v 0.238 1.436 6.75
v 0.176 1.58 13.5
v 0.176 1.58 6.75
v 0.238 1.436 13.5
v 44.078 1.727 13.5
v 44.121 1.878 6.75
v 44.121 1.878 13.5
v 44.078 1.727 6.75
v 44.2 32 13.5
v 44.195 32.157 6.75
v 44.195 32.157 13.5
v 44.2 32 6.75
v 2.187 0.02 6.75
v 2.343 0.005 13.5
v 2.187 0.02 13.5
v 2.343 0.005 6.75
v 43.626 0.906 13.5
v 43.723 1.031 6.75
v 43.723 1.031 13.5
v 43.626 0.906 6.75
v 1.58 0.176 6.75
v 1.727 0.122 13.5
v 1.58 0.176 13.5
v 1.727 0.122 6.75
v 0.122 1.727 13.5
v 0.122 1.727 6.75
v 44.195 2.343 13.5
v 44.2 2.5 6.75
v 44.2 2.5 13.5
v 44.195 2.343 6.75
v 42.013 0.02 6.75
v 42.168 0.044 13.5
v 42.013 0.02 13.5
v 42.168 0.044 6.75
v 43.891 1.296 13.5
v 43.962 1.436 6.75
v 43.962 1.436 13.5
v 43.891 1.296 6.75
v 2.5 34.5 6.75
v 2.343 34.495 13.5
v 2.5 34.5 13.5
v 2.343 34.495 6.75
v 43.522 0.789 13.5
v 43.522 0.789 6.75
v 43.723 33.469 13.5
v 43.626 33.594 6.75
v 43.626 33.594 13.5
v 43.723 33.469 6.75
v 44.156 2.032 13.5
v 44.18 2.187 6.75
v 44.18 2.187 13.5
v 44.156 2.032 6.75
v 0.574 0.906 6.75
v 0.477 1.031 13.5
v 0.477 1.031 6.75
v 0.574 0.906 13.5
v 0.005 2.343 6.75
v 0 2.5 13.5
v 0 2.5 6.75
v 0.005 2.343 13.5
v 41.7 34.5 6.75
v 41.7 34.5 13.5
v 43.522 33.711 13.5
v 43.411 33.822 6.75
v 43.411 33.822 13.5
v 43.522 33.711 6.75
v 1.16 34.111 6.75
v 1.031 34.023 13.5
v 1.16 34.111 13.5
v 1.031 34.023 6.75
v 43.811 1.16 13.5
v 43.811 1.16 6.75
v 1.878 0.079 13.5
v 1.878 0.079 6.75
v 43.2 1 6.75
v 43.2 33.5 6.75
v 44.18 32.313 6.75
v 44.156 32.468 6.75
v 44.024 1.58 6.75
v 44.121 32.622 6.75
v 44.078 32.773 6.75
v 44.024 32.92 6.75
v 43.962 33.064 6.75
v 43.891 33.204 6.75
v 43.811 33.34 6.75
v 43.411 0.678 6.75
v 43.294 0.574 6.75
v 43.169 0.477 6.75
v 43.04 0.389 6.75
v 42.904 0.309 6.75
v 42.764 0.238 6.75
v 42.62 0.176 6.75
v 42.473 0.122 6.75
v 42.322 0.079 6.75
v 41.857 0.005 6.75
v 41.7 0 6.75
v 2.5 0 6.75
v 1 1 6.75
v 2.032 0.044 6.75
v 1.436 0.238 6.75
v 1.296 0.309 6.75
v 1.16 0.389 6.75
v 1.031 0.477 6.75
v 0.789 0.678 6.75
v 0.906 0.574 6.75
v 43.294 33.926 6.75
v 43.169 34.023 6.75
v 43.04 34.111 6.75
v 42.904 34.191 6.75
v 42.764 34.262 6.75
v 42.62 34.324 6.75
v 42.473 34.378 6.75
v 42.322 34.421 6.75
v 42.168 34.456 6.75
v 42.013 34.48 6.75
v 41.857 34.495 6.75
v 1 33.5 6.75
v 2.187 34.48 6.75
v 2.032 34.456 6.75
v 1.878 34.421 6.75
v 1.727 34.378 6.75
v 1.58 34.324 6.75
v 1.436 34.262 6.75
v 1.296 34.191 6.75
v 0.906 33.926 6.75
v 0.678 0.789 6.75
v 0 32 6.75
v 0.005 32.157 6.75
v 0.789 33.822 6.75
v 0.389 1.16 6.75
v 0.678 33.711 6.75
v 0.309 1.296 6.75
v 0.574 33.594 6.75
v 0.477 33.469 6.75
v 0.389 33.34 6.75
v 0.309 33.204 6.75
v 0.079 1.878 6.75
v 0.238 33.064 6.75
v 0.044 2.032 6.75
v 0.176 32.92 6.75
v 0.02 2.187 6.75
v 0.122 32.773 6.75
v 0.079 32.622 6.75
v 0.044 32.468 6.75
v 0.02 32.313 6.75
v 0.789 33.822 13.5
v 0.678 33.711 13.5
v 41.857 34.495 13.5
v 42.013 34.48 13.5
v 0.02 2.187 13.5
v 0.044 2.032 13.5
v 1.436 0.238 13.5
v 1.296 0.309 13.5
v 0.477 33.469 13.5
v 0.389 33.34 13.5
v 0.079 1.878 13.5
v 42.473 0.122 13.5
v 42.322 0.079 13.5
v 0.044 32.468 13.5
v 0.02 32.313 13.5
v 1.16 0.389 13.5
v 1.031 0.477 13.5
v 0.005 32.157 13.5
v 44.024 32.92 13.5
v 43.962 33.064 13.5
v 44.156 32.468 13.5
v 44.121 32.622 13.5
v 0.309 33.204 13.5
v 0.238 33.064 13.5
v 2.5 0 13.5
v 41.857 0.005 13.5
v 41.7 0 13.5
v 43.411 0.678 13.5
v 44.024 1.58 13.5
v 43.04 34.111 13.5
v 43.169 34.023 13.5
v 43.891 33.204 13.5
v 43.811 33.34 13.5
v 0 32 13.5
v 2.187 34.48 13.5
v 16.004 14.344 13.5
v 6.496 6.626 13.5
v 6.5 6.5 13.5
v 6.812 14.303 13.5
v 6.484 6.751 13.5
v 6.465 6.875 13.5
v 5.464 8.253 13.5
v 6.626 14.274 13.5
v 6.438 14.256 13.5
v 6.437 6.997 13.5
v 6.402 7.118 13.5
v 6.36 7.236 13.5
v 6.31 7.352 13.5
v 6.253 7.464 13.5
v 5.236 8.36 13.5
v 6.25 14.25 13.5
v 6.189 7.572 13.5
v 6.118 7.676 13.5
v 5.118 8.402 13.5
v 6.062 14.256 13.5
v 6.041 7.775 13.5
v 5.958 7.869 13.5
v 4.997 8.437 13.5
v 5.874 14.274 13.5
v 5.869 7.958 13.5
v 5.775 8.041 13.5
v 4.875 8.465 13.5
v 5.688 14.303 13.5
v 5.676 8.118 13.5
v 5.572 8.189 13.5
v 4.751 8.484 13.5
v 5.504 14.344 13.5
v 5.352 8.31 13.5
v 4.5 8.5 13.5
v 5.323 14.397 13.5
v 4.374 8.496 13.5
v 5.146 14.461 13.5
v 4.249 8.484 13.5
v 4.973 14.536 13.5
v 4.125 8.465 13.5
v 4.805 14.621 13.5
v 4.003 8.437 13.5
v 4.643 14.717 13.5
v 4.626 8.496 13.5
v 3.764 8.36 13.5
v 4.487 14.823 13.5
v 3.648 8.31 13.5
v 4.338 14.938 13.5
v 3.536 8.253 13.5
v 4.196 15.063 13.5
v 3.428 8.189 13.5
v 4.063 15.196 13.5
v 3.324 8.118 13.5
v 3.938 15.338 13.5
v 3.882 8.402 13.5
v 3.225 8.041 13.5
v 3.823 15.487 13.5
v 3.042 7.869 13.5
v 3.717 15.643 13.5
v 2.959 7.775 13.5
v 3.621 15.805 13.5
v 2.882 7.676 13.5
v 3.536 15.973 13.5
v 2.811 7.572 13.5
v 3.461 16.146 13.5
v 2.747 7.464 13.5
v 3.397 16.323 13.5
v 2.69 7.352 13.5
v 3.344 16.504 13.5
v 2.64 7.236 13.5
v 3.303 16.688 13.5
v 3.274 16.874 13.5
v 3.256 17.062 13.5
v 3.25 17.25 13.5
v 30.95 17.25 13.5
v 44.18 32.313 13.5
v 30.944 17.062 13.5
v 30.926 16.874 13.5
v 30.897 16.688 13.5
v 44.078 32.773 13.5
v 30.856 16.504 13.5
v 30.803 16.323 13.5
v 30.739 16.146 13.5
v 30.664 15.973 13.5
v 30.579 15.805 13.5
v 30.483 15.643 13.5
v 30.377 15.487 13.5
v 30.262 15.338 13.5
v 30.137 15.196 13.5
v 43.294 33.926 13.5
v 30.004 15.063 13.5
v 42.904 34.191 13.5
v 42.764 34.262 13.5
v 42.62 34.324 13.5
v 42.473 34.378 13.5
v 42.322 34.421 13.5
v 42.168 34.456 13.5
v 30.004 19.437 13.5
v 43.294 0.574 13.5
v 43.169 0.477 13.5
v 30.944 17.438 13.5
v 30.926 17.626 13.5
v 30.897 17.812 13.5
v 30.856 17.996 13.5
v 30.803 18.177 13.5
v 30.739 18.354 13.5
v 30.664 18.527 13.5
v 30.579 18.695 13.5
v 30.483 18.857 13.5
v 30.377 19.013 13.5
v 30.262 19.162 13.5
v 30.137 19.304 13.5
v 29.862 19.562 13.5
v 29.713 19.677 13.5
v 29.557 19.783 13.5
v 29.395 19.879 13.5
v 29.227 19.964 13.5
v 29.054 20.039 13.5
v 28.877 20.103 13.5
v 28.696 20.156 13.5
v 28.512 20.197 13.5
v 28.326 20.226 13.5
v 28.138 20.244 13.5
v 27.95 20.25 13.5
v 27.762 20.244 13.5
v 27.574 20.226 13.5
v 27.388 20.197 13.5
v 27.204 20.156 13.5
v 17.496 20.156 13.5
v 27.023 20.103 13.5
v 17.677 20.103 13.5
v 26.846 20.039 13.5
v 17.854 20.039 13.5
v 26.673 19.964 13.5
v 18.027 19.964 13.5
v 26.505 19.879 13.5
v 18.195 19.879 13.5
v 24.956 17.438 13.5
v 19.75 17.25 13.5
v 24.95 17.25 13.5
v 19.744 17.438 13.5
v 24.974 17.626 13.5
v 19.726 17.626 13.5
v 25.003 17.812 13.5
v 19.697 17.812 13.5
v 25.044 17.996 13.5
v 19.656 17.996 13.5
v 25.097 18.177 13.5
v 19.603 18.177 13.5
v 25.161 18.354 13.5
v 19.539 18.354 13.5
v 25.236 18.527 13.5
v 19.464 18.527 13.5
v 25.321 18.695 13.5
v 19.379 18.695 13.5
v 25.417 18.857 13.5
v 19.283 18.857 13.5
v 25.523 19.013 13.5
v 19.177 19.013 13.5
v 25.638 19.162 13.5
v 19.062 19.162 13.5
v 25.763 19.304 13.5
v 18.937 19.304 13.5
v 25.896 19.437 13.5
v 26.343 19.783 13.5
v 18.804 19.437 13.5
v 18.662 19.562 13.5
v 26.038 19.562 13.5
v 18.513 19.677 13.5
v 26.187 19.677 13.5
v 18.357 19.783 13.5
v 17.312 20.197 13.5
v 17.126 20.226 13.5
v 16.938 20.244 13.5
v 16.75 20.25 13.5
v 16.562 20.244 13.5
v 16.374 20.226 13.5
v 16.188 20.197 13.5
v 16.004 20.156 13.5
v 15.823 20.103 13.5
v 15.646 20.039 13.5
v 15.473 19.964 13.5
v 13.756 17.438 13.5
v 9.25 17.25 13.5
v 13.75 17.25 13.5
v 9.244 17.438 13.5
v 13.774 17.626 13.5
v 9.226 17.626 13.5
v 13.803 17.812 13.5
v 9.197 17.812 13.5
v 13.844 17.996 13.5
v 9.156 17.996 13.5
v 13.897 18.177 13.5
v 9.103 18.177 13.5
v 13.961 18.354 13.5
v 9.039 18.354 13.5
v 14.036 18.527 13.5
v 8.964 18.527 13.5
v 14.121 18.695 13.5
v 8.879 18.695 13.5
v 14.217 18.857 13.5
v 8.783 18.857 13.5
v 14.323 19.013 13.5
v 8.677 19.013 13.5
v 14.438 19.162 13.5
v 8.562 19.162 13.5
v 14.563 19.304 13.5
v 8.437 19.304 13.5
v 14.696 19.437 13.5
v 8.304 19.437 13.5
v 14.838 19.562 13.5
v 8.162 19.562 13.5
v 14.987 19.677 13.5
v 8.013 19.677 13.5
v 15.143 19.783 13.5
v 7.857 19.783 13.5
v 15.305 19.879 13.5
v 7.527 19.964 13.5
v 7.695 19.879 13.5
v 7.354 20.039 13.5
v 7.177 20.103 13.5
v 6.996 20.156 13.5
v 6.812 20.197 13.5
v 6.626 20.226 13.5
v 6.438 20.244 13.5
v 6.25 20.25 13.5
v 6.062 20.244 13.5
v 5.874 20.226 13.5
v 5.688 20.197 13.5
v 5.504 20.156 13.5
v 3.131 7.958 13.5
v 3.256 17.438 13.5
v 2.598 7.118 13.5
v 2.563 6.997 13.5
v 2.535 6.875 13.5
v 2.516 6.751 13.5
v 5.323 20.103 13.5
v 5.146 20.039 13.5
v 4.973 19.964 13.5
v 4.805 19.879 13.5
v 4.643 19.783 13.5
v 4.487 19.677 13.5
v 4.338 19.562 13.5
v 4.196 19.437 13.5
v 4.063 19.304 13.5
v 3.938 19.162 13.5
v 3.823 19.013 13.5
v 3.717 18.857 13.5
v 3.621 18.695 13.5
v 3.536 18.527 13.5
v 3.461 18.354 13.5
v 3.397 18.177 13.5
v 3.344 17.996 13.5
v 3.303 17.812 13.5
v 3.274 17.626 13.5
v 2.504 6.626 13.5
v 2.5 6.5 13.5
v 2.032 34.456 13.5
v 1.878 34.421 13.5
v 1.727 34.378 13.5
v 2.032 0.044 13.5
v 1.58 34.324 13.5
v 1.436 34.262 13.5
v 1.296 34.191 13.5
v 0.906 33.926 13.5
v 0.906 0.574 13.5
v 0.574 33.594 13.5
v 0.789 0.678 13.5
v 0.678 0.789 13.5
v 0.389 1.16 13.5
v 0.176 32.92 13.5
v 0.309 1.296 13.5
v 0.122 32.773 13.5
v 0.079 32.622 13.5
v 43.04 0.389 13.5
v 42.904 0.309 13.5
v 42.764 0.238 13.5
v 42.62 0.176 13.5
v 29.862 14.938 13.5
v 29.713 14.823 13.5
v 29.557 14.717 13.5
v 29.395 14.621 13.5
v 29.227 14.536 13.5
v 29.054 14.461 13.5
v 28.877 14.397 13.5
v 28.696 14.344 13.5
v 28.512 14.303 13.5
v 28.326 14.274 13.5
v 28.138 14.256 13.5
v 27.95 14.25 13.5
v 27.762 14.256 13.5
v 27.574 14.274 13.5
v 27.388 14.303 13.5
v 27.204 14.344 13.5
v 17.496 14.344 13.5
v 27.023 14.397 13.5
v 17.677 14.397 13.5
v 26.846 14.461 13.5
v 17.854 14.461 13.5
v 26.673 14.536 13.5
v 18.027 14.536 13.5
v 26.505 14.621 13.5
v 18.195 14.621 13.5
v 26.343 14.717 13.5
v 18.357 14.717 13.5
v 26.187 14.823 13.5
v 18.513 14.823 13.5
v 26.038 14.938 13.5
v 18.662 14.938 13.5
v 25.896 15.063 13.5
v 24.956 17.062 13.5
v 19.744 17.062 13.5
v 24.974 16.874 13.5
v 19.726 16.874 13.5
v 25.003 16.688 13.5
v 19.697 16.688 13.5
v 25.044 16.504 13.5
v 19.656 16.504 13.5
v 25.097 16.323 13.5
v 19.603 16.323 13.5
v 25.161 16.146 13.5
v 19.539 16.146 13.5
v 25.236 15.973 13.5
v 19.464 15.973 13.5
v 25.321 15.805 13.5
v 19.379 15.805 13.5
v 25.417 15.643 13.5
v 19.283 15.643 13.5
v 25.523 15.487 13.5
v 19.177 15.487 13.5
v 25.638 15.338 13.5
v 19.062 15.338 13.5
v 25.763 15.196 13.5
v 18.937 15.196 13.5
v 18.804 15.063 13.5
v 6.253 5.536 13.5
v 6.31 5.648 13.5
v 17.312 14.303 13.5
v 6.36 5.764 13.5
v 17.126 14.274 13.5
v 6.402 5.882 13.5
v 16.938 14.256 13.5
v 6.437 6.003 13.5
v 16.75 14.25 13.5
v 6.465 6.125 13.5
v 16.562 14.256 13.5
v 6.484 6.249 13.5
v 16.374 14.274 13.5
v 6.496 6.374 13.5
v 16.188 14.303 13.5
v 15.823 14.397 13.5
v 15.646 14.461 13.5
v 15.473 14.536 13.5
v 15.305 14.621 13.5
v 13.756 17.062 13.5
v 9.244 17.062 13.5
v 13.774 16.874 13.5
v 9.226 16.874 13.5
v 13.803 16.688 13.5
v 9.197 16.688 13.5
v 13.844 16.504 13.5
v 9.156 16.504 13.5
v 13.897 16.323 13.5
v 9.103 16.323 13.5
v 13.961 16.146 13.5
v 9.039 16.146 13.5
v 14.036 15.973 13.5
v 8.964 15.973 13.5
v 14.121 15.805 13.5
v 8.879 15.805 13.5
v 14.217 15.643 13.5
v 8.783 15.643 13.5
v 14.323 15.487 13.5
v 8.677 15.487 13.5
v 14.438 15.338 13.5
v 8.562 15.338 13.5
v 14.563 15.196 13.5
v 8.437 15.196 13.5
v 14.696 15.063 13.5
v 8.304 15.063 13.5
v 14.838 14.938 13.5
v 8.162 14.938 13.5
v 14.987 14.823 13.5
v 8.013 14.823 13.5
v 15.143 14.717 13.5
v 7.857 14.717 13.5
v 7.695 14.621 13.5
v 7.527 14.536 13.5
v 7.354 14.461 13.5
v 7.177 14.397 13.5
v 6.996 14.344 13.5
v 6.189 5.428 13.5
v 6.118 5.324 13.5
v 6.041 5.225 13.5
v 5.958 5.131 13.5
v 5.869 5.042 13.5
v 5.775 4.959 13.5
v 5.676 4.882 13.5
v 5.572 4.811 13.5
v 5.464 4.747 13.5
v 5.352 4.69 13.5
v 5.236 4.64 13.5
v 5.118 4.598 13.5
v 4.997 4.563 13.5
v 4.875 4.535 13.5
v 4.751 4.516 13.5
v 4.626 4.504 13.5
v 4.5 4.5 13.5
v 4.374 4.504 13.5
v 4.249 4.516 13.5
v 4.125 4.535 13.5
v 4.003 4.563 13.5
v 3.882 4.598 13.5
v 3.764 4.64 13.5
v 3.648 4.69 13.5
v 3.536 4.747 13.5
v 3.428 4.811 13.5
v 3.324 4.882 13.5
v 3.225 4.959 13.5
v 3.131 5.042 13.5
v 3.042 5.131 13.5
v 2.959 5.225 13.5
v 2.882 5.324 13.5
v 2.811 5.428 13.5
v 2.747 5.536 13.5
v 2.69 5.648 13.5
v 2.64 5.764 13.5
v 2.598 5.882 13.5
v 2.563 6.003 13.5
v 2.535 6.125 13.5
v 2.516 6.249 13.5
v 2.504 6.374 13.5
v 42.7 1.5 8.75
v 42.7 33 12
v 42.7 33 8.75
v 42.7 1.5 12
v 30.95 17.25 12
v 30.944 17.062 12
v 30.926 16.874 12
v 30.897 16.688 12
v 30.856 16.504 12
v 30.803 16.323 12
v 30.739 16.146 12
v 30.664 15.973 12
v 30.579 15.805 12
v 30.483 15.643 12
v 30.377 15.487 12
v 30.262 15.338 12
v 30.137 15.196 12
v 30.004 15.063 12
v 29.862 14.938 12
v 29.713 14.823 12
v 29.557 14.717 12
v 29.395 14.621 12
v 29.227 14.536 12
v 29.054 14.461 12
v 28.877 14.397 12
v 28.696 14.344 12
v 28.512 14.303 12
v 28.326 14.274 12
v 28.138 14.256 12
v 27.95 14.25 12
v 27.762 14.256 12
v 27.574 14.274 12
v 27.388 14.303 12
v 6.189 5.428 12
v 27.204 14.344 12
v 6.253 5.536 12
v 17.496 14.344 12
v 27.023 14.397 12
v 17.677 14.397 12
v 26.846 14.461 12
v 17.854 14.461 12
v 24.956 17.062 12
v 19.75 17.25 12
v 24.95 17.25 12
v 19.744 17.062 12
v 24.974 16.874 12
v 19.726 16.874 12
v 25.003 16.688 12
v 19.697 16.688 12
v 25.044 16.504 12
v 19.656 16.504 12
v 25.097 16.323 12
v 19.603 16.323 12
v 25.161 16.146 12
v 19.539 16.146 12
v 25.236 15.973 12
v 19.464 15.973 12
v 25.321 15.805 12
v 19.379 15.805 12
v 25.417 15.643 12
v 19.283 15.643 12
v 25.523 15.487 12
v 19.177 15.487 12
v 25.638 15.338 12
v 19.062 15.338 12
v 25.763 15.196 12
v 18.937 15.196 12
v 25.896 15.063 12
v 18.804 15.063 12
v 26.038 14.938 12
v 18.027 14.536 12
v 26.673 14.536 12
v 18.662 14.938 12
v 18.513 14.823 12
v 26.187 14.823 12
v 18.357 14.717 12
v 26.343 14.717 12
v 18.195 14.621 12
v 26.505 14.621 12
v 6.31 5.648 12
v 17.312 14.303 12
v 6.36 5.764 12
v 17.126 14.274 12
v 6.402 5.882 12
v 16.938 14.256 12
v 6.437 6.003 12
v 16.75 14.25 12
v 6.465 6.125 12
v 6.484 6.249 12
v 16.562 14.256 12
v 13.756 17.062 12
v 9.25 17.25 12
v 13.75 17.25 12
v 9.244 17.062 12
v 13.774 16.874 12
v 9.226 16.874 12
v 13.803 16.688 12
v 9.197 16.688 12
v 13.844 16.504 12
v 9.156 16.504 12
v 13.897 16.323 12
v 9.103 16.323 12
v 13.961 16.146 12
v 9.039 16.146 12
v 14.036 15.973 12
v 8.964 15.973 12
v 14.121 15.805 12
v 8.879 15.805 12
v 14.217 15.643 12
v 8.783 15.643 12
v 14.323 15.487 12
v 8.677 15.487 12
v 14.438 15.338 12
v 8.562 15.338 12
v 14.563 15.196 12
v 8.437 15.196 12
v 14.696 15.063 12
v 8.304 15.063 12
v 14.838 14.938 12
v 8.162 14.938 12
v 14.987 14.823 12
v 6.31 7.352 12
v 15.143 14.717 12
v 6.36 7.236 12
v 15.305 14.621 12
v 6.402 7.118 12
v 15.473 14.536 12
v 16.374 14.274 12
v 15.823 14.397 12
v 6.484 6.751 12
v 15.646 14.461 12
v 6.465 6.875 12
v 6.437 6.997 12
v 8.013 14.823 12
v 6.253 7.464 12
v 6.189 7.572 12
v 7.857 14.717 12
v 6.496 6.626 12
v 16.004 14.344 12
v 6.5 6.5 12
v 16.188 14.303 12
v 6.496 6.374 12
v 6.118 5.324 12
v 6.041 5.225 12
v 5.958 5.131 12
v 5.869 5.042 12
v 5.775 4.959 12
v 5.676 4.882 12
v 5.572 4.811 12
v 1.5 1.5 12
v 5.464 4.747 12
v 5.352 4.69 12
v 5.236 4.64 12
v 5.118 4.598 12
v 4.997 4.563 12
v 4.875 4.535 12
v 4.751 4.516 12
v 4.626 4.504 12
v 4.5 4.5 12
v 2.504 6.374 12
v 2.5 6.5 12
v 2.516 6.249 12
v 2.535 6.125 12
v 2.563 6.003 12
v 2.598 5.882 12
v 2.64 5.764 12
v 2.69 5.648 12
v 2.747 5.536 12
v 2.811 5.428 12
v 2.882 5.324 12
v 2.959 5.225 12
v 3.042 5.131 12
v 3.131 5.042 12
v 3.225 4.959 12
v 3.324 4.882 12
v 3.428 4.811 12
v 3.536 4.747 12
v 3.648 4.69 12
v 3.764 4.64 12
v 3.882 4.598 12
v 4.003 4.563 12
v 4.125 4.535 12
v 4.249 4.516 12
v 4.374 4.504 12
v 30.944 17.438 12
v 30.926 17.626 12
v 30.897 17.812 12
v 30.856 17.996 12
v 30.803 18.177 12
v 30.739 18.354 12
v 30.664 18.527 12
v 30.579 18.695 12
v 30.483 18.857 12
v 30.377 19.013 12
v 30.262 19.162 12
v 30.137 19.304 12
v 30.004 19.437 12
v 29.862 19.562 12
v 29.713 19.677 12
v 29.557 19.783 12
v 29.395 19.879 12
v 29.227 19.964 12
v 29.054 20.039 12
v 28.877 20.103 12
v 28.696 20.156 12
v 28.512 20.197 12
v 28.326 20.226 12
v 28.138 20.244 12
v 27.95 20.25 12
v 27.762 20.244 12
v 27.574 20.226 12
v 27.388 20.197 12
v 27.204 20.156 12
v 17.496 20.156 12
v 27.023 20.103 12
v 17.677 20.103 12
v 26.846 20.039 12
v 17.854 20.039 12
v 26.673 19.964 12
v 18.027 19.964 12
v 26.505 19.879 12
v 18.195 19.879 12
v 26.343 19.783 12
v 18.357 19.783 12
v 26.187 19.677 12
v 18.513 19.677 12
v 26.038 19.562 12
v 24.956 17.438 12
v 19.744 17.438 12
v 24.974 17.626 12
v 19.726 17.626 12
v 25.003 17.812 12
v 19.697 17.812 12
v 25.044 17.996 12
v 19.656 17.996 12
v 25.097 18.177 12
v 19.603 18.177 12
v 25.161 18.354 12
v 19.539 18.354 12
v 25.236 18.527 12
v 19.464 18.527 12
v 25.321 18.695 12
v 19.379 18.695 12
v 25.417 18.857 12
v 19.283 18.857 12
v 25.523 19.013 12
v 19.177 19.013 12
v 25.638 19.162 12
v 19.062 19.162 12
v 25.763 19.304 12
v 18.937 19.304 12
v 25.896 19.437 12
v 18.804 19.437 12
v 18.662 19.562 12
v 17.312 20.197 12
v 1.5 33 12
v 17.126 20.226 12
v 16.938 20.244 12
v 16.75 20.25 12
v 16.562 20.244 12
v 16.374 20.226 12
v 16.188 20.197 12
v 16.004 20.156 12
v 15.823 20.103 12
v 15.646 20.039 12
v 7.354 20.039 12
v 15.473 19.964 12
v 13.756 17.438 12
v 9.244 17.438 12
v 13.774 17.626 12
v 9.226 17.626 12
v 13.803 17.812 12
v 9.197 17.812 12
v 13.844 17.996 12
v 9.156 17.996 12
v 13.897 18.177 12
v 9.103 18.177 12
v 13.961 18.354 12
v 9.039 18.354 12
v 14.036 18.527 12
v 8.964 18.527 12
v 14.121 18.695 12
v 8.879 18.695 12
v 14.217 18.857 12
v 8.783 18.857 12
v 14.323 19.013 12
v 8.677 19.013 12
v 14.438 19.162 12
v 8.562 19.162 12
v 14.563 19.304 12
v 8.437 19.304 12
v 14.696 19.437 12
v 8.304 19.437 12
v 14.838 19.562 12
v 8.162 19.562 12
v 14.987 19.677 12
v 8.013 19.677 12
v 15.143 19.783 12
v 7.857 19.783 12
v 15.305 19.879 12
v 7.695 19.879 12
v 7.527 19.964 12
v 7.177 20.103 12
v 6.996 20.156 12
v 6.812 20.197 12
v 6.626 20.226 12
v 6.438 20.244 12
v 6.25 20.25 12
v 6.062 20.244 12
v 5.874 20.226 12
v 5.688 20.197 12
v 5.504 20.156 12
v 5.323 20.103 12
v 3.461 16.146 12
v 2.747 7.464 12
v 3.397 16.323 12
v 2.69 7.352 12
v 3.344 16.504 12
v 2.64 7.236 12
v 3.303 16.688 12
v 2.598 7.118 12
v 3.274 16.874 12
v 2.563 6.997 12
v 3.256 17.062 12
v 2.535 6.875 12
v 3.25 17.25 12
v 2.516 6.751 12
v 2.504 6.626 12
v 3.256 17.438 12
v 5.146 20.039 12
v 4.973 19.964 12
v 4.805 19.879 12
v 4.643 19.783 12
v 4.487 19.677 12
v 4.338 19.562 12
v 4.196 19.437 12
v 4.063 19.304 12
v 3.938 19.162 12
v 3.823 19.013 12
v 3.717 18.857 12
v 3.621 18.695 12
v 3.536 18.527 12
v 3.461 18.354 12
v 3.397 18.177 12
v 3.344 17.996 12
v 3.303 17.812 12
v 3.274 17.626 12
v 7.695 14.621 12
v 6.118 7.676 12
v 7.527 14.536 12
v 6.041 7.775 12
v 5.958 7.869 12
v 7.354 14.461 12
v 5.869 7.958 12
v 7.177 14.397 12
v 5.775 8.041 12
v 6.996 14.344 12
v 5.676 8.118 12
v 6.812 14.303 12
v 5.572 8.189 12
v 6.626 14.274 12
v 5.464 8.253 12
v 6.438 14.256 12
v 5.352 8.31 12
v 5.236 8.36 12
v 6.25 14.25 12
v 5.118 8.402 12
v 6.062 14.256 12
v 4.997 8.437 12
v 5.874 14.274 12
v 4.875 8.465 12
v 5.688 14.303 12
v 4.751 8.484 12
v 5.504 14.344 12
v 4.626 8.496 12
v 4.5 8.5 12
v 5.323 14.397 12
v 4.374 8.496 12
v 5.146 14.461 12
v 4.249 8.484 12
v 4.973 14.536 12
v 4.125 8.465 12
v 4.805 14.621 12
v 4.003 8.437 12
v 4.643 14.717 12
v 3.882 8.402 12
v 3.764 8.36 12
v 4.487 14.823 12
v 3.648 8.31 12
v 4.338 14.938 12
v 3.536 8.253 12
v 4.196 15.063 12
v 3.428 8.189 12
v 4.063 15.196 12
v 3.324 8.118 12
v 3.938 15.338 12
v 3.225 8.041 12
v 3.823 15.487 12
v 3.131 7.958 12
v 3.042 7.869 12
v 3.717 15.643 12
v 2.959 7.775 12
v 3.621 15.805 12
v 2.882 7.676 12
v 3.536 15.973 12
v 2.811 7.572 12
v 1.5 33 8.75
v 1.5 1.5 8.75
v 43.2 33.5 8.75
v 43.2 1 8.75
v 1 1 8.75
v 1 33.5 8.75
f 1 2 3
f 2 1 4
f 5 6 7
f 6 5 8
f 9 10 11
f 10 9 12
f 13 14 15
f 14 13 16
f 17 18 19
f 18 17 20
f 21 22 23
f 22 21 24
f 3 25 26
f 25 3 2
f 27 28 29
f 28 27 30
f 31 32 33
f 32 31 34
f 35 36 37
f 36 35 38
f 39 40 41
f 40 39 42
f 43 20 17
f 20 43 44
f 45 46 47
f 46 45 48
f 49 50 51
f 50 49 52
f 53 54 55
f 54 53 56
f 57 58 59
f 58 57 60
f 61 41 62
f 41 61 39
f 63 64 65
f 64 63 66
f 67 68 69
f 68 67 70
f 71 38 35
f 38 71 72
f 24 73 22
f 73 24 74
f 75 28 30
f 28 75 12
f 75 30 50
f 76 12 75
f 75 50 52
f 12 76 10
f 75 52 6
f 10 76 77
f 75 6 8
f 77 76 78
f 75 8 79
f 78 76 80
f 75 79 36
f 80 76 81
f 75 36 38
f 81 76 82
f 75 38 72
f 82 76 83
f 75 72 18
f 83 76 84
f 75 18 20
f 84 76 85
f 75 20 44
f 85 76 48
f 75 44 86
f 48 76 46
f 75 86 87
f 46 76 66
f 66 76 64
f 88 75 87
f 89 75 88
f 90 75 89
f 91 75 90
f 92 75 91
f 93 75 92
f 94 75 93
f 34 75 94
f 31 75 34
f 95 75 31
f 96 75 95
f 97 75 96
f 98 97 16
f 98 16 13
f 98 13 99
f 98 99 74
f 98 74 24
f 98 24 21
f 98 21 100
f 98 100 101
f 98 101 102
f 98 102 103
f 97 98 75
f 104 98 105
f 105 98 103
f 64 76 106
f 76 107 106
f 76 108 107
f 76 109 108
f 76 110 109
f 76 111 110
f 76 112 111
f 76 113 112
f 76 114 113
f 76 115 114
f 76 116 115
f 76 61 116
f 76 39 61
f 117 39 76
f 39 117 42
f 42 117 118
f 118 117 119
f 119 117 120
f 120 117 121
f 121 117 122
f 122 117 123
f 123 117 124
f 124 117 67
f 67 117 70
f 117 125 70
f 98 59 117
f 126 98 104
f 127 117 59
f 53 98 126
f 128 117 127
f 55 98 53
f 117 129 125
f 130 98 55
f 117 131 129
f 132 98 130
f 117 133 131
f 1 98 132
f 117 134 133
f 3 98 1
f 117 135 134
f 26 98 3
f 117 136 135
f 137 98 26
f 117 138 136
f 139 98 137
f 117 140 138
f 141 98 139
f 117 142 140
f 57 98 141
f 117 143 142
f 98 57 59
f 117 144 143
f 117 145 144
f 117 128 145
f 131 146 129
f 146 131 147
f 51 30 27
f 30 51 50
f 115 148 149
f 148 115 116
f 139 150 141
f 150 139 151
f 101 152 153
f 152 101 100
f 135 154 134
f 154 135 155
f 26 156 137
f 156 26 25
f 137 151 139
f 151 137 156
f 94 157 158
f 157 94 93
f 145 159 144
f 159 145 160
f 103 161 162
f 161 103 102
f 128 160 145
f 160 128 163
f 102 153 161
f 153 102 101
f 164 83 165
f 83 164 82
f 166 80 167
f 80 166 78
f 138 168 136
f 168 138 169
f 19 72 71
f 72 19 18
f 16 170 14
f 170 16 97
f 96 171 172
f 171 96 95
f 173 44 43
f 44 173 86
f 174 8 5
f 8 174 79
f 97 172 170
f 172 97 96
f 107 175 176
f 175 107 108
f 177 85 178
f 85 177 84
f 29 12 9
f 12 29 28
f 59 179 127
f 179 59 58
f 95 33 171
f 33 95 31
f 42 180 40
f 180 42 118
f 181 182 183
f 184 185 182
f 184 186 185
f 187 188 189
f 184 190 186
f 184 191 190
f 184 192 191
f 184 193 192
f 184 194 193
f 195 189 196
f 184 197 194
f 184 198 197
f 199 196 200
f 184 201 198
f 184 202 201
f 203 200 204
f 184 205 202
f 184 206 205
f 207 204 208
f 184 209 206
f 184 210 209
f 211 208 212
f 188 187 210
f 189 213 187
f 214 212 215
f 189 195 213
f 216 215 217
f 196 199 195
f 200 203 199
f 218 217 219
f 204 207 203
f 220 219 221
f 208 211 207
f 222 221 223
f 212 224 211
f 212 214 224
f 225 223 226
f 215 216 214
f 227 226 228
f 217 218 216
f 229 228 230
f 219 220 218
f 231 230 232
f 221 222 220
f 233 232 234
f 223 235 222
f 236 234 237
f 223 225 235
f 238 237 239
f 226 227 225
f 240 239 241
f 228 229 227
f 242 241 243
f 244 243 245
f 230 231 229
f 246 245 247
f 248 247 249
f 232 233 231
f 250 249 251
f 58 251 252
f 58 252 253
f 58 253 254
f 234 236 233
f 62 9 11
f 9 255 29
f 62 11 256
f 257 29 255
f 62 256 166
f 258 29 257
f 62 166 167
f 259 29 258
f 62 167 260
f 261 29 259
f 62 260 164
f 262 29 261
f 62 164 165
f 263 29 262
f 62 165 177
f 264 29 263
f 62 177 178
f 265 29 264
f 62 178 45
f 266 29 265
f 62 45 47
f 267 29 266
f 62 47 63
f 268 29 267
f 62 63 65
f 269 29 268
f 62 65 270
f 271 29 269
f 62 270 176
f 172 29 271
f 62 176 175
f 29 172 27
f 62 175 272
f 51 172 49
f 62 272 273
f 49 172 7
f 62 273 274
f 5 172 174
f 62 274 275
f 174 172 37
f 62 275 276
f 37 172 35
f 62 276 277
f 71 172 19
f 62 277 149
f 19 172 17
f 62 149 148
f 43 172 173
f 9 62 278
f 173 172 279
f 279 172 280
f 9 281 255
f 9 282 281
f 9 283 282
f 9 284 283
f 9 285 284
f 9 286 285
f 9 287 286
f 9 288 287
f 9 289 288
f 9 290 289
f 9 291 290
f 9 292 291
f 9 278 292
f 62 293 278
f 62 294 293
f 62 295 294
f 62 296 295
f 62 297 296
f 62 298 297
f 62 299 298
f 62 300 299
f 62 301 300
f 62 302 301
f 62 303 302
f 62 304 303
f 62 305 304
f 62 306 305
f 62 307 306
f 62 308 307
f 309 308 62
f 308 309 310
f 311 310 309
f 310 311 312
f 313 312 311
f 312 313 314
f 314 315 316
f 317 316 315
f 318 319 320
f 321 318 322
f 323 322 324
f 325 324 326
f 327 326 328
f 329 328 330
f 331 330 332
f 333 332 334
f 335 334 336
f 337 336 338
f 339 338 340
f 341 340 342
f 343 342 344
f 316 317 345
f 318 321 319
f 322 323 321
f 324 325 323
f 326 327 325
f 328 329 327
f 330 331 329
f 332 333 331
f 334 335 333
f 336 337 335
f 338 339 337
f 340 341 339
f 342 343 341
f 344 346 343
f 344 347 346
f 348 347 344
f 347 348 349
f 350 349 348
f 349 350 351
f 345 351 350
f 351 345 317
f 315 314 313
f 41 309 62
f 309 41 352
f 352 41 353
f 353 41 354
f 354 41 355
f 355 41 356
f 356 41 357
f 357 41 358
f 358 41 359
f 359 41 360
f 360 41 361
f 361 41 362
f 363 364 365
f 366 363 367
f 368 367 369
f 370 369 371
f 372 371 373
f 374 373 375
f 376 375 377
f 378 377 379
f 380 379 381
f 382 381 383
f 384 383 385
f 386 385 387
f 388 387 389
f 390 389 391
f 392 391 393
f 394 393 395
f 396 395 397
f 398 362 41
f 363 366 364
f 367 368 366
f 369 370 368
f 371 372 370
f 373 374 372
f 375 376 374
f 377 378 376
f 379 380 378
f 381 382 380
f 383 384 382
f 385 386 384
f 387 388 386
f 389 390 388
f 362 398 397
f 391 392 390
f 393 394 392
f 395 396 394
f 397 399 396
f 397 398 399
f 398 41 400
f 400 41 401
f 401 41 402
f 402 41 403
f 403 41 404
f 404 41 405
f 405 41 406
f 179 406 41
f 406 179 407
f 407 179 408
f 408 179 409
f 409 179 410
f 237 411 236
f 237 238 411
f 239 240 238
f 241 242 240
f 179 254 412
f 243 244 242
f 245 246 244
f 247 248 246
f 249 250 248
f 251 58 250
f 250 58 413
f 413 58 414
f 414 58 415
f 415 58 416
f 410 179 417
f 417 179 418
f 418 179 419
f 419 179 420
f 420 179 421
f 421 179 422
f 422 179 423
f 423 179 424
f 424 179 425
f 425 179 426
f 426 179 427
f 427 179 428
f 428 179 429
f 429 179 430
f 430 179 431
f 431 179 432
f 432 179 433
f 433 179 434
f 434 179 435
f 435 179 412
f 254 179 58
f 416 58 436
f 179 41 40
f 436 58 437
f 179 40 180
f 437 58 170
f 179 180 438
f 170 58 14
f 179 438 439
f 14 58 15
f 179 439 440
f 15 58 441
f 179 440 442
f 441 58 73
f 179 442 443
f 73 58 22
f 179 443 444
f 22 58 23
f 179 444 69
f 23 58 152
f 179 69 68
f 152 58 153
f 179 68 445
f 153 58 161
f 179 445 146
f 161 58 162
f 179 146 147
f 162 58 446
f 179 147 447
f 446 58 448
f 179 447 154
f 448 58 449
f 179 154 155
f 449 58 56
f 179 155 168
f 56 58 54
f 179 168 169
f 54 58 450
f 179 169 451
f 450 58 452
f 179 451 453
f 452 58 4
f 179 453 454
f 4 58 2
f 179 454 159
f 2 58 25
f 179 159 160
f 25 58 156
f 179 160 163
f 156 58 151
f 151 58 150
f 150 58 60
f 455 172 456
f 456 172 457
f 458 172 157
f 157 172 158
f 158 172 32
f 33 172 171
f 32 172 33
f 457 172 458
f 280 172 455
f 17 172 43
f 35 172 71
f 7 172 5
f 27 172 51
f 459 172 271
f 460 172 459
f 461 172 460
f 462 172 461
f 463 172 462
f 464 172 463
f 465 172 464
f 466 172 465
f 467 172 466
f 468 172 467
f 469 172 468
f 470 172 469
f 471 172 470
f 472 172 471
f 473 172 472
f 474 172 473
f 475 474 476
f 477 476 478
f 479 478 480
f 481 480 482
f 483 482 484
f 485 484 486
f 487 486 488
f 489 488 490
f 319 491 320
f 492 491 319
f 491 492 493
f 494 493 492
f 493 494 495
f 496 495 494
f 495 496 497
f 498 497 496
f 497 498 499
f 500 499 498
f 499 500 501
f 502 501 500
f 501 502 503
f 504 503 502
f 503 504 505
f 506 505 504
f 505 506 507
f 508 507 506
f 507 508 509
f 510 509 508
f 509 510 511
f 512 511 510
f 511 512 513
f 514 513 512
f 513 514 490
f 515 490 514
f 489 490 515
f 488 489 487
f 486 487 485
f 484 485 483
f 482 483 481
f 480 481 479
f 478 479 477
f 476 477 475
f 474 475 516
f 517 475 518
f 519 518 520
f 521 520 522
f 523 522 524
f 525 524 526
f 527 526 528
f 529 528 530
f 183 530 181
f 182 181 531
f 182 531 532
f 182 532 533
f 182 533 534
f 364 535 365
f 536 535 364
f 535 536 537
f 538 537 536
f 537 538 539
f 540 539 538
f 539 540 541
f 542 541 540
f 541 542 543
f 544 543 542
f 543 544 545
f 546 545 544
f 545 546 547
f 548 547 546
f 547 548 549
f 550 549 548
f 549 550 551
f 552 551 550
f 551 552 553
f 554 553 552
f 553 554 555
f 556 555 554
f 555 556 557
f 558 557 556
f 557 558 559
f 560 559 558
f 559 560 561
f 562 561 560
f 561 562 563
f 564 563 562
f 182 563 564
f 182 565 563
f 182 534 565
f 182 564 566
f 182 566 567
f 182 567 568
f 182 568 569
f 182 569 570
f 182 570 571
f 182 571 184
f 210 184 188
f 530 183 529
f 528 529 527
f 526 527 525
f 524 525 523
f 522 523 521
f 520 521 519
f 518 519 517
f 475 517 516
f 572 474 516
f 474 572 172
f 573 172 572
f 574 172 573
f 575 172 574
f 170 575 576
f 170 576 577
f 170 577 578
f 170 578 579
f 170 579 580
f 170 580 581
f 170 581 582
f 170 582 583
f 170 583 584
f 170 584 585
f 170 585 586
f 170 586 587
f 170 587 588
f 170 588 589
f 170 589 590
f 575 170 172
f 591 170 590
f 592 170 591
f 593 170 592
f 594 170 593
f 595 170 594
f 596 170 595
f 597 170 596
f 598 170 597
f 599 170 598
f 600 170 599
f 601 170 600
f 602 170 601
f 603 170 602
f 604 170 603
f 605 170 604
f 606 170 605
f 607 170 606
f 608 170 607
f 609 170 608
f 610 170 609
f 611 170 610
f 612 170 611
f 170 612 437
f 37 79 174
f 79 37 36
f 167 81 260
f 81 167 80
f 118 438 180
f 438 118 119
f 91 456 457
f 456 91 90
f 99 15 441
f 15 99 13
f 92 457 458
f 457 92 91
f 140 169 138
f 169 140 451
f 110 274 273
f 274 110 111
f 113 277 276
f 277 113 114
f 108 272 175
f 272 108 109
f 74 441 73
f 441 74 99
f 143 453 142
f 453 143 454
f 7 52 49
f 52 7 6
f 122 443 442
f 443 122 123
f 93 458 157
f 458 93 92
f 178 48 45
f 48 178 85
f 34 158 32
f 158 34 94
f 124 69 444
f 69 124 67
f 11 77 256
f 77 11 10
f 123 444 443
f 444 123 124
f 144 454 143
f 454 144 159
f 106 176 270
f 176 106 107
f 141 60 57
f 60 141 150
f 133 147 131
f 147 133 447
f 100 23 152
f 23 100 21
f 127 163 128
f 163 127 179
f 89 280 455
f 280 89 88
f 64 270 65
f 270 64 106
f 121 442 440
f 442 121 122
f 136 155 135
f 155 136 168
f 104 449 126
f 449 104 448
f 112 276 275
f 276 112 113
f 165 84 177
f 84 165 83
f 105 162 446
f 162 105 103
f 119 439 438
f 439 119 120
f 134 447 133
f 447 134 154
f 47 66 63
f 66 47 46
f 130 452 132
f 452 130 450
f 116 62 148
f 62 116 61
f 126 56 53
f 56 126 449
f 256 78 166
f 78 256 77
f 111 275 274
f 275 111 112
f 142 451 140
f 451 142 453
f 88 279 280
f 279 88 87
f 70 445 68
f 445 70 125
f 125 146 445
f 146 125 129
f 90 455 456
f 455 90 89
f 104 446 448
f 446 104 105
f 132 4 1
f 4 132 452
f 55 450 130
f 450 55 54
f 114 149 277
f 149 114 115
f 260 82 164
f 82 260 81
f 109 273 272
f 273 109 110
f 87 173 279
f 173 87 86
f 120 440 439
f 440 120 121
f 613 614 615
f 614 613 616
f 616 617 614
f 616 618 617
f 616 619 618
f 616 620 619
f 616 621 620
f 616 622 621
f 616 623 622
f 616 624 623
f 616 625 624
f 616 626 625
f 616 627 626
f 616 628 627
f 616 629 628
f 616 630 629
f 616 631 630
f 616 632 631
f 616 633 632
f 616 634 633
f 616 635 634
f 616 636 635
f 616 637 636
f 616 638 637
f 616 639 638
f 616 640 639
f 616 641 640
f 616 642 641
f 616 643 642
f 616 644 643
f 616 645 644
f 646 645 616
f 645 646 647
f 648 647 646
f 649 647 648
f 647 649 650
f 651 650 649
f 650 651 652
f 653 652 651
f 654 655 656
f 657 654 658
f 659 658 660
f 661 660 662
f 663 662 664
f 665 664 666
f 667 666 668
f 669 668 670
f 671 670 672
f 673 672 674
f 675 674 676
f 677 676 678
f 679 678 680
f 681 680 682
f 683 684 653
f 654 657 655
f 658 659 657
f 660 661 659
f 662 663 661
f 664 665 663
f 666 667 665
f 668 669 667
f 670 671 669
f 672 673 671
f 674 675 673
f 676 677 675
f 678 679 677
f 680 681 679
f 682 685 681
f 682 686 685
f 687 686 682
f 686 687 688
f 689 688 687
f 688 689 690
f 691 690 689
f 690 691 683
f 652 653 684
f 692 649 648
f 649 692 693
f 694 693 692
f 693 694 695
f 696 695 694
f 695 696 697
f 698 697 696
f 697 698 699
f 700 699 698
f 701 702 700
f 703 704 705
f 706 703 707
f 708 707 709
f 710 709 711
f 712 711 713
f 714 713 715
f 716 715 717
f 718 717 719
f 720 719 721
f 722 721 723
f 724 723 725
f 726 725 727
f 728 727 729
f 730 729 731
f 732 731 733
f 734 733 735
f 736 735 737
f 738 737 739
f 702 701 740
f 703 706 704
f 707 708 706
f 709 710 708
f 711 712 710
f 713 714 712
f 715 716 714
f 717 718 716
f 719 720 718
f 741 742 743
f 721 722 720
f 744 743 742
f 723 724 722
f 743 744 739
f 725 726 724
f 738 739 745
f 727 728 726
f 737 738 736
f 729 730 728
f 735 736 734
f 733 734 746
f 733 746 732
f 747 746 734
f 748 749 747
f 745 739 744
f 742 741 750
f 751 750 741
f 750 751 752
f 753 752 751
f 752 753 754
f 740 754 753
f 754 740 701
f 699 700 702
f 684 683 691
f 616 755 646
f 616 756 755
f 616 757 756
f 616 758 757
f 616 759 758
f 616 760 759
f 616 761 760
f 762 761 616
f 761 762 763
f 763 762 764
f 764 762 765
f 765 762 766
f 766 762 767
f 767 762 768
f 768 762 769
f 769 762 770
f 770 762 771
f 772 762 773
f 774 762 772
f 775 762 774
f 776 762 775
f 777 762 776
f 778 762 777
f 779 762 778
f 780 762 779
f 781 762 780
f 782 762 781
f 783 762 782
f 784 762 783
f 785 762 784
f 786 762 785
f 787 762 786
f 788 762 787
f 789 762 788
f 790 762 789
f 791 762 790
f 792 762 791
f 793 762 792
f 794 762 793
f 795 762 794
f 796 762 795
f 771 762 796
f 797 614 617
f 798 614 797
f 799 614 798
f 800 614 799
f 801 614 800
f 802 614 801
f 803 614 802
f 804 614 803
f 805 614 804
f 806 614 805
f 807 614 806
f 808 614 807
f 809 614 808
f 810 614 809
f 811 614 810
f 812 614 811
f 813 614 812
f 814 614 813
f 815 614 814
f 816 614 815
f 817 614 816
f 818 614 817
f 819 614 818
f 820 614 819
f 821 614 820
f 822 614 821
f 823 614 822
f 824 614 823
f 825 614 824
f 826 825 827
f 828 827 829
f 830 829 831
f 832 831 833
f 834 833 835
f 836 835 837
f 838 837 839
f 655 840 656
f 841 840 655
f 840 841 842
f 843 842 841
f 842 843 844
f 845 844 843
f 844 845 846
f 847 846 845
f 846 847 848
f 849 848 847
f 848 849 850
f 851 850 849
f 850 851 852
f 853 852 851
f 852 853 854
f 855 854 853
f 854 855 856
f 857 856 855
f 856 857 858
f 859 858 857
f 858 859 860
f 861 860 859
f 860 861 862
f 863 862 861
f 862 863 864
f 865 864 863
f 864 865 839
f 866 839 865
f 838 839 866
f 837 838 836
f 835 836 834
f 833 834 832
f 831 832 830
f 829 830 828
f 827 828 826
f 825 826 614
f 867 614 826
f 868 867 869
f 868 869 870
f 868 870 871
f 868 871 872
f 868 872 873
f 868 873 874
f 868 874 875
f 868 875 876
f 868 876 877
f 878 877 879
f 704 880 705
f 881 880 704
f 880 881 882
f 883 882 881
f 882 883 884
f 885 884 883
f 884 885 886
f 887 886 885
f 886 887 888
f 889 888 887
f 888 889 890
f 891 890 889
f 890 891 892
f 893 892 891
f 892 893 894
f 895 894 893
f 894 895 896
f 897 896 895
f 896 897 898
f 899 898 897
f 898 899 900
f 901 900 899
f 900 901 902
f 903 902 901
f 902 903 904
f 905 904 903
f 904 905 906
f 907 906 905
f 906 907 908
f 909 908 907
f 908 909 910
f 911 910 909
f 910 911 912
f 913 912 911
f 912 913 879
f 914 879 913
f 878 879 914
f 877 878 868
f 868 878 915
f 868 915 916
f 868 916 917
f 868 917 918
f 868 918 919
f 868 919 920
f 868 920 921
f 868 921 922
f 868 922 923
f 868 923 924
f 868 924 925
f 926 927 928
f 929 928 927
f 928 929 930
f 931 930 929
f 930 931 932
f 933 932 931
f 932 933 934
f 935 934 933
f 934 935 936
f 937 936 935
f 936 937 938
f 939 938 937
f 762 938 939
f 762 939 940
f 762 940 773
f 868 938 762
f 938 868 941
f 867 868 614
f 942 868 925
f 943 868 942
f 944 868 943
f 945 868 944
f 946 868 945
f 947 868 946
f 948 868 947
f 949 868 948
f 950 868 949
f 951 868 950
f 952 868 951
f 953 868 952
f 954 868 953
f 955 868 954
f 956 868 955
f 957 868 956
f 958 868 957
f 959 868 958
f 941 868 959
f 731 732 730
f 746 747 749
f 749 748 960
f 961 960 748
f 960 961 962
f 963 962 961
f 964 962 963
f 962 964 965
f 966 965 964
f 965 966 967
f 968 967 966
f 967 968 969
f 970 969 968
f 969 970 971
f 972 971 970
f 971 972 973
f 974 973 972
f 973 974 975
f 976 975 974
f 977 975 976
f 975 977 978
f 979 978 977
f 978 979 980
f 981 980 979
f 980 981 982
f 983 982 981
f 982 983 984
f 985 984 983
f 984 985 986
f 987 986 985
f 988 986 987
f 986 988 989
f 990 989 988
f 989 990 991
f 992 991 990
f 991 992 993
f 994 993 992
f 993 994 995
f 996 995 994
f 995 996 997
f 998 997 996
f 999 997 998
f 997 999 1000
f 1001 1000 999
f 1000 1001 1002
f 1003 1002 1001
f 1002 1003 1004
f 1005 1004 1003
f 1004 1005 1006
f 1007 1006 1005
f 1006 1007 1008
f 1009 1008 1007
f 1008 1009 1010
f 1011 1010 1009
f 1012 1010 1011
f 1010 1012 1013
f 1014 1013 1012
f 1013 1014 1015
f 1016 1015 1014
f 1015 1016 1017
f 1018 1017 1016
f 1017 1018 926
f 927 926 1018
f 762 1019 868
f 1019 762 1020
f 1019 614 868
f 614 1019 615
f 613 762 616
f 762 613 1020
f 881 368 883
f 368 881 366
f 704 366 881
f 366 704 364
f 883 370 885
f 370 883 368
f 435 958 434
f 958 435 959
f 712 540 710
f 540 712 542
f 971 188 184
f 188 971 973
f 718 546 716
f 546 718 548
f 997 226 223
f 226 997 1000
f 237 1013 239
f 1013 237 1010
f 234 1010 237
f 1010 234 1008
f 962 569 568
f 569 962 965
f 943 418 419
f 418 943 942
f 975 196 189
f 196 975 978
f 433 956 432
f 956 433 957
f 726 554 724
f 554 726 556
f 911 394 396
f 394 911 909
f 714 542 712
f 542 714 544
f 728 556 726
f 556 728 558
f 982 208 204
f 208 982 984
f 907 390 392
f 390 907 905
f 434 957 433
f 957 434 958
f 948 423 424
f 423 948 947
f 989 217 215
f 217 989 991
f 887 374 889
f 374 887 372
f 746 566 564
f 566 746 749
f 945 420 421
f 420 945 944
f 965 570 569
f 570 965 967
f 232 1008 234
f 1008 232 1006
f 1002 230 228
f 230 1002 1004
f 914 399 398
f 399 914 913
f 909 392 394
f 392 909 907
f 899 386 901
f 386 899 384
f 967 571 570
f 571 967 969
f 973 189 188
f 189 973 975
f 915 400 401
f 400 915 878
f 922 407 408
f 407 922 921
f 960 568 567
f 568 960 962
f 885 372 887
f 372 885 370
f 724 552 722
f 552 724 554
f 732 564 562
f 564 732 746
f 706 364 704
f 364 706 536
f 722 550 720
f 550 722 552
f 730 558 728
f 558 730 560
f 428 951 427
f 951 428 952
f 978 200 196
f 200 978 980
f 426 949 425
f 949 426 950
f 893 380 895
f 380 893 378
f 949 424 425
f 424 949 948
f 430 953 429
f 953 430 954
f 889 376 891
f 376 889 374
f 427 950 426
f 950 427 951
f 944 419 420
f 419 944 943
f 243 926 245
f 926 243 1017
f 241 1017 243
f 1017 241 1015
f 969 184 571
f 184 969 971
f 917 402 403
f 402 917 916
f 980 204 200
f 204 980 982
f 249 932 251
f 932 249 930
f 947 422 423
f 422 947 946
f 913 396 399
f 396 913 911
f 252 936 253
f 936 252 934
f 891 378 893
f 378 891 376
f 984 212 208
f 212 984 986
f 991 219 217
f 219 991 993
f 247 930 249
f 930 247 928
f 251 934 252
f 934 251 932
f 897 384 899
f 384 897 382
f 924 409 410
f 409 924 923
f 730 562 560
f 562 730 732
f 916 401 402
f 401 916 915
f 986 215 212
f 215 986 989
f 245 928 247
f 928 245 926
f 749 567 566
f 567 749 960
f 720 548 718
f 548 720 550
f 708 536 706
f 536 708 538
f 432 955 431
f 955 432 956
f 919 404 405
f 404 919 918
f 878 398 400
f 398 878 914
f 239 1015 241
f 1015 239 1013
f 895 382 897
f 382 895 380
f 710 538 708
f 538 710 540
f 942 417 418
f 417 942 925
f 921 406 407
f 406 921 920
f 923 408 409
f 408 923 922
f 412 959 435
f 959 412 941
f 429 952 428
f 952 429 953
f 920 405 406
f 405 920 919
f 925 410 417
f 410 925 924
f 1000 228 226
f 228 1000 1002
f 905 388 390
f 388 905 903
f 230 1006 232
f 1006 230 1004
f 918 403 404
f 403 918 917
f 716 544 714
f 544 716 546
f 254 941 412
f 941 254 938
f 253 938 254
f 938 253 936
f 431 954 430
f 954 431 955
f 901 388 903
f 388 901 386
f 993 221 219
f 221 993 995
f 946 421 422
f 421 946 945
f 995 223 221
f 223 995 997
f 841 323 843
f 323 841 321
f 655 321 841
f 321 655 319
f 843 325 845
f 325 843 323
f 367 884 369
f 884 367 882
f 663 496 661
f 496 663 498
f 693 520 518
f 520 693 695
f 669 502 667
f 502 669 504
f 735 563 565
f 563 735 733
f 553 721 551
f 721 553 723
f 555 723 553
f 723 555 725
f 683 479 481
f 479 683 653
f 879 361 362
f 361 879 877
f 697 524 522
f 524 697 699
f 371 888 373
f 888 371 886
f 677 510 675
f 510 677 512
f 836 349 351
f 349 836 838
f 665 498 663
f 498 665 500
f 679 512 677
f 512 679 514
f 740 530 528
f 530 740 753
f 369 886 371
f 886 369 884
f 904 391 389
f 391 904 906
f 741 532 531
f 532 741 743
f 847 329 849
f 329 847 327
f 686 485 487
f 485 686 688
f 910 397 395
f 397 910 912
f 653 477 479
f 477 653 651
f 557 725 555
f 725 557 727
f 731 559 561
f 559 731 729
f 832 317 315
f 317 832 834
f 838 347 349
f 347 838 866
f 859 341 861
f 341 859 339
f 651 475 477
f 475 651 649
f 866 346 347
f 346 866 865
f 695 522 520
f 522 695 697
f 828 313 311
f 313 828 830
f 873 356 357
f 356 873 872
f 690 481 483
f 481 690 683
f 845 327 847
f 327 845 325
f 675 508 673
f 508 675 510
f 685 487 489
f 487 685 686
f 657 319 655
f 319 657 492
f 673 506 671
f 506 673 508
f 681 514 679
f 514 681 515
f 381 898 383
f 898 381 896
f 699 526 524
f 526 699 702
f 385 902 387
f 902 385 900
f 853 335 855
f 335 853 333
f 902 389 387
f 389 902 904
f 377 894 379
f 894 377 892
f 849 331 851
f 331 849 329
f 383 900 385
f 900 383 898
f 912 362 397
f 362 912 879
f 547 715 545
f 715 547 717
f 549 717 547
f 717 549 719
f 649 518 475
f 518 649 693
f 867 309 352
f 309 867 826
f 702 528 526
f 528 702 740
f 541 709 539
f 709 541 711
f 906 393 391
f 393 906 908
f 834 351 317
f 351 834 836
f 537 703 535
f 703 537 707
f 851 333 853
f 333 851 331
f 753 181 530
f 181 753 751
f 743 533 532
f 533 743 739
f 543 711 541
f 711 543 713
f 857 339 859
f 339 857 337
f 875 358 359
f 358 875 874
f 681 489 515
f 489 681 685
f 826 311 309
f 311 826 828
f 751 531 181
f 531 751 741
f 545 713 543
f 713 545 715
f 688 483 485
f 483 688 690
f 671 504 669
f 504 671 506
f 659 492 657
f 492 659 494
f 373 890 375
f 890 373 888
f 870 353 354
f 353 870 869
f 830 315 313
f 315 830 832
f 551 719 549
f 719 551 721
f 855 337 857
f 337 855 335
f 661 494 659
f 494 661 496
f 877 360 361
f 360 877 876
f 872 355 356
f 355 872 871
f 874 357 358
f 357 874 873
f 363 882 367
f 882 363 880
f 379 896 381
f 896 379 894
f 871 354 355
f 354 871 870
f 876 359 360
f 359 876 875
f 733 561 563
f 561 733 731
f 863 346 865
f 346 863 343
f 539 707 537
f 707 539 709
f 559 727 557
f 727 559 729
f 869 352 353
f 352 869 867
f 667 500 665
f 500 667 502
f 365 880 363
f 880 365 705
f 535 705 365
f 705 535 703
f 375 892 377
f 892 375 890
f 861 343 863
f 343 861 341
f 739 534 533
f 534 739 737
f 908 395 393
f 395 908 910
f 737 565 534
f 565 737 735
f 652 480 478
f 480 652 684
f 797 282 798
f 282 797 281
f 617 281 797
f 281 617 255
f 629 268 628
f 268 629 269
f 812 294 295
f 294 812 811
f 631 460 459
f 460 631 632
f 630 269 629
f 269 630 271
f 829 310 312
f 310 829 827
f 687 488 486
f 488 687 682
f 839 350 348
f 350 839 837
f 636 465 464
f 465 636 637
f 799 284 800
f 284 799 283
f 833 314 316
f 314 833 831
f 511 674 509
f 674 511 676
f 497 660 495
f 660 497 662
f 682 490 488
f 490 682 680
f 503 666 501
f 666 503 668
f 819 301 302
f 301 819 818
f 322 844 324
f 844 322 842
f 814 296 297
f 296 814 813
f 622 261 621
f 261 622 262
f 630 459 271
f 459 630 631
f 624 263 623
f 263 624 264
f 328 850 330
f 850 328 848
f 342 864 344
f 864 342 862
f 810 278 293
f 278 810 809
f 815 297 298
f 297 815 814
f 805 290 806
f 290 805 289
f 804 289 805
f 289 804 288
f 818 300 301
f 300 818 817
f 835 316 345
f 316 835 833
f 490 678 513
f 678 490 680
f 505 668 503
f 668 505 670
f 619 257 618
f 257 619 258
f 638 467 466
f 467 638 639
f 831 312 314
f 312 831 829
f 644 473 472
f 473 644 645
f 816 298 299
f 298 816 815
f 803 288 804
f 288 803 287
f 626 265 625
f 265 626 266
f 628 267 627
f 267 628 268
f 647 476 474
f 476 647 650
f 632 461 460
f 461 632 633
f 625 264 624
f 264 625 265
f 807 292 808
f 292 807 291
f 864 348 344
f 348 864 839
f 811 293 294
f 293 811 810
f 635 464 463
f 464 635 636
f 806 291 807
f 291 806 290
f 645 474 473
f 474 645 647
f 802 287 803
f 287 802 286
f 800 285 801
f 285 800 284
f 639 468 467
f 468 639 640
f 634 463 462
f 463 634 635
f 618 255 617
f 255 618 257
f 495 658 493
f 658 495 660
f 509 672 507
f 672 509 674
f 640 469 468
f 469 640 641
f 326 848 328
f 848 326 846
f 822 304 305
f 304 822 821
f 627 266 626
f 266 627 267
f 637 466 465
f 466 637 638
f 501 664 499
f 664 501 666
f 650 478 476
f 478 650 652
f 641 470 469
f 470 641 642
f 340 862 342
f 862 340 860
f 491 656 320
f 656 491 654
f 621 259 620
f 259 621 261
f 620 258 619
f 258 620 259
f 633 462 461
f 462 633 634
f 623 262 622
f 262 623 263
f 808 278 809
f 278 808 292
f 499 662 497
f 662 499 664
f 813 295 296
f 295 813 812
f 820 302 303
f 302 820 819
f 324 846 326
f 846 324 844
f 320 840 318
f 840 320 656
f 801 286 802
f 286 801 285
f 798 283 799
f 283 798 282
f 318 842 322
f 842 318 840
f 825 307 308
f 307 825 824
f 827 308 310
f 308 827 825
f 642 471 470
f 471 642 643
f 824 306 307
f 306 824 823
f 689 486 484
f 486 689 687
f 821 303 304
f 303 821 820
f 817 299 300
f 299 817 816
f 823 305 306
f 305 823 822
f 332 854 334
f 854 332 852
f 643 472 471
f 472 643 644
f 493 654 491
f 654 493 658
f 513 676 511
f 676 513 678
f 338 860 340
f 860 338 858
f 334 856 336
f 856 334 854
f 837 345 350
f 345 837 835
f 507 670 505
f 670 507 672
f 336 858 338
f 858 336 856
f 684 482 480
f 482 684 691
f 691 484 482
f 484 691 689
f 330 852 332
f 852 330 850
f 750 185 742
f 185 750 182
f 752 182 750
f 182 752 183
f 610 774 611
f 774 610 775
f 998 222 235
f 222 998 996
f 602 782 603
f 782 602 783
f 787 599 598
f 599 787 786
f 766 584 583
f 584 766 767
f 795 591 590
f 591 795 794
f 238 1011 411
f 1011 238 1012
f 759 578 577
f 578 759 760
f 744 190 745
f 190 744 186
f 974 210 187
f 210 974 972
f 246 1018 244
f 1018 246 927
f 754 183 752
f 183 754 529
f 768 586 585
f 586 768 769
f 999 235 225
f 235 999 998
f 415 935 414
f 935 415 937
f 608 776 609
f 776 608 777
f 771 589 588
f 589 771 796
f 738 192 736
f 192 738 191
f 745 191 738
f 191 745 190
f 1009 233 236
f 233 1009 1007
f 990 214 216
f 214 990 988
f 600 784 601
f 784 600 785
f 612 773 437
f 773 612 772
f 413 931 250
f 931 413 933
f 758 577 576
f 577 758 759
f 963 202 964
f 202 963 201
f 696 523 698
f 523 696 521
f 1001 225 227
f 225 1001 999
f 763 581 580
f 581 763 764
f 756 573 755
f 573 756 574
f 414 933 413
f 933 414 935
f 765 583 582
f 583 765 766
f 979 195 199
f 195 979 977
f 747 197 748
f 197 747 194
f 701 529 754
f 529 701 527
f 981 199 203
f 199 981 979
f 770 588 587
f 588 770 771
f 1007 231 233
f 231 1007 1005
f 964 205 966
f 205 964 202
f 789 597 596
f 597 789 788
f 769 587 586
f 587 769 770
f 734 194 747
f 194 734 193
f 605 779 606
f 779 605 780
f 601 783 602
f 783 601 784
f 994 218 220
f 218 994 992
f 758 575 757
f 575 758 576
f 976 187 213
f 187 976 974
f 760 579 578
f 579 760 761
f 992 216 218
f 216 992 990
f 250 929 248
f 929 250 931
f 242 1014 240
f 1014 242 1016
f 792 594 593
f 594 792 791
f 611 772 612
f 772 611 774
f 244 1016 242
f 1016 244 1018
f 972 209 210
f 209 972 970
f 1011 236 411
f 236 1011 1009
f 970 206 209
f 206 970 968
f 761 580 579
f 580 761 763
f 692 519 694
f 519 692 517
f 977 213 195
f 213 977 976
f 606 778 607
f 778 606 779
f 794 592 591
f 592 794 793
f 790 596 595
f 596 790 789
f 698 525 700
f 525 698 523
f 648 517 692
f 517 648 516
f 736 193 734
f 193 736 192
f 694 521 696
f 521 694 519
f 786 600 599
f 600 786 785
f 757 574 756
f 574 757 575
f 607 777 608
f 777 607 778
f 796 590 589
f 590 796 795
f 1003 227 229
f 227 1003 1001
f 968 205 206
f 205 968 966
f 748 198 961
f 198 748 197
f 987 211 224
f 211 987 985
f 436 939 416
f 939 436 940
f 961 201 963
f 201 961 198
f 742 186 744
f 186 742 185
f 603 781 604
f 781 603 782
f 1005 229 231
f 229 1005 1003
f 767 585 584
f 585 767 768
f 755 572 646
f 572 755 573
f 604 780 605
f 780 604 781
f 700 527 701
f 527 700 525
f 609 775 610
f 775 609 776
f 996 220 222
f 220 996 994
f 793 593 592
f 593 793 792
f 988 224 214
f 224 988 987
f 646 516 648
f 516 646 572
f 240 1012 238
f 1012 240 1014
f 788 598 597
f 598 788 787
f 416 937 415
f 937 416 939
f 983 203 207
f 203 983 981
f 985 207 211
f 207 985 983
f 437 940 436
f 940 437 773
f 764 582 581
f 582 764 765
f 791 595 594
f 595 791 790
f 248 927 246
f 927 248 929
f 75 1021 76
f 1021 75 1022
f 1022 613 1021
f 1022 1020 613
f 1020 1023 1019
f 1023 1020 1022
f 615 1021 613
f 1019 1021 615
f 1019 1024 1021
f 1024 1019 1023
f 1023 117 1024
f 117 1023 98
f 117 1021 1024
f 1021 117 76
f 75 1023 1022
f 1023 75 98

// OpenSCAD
$fn = 100;

// vysota schemy
h = 10.5;
// enclousure params
paz = 2;
// enclousure wall thikness
wthikness = 1.5;
// i* - inner
iheight = h / 2;
iwidht = 31.5;
ilenght = 41.2;
// o* - outer
olenght = ilenght + wthikness * 2;
owidht = iwidht + wthikness * 2;
oheight = iheight + wthikness;
// corner radius
cr = 2.5;
pazcr = cr - 1; // s obei storon po 0.5 
// buttons radius
br = 3;

difference() {
    translate([0, 0, oheight]) {
        enclousureTop(0, 0, 0);
    }
    enclousureBottom(0, 0, 0);
}

// Enclousure module
module enclousureTop(xpos, ypos, zpos) {
    // buttons specs
    butw = 3.5;
    butcenter = wthikness + (butw / 2);
    but1 = 3 + butcenter;
    but2 = but1 + butw + 7;
    but3 = but2 + butw + 7.7;
    
    translate([xpos, ypos, zpos]) {
        difference() {
            mainBox();
            translate([wthikness, wthikness ,0]) {
                cube([ilenght, iwidht, iheight]);
            }
            // buttons spaces
            translate([but1, wthikness + (iwidht / 2), oheight - wthikness]) {
                cylinder(r = br, h = wthikness);
            }
            translate([but2, wthikness + (iwidht / 2), oheight - wthikness]) {
                cylinder(r = br, h = wthikness);
            }            translate([wthikness, wthikness ,0]) {
                cube([ilenght, iwidht, iheight]);
            }
            translate([but3, wthikness + (iwidht / 2), oheight - wthikness]) {
                cylinder(r = br, h = wthikness);
            }
            // led space
            translate([wthikness + 3, wthikness + 5, oheight - wthikness]) {
                cylinder(r = 2 , h = wthikness);
            }
        }
    }
}

module mainBox() {
    hull() {
        translate([cr, cr, 0]) {
            cylinder(r = cr, h = iheight + wthikness);
        }
        translate([olenght - cr, owidht - cr, 0]) {
            cylinder(r = cr, h = iheight + wthikness);
        }
        translate([olenght - cr, cr, 0]) {
            cylinder(r = cr, h = iheight + wthikness);
        }
        translate([cr, owidht - cr, 0]) {
            cylinder(r = cr, h = iheight + wthikness);
        }
    }
}

// Enclousure module
module enclousureBottom(xpos, ypos, zpos) {
    translate([xpos, ypos, zpos]) {
        difference() {
            mainBox();
            translate([wthikness, wthikness , wthikness]) {
                cube([ilenght, iwidht, iheight]);
            }
        }
        // Peregorodka
        translate([33, wthikness + (iwidht - 20) / 2, wthikness]) {
            cube([1, 20, iheight]);
        }
        // Paz
        translate([wthikness - 0.5 , wthikness - 0.5, wthikness + iheight]) {
            paz();
        }
    }
}

module paz() {
    difference() {
        cube([ilenght + 1, iwidht + 1, paz]);
        translate([0.5, 0.5, 0]) {
            cube([ilenght, iwidht, paz]);
        }
    }
}
